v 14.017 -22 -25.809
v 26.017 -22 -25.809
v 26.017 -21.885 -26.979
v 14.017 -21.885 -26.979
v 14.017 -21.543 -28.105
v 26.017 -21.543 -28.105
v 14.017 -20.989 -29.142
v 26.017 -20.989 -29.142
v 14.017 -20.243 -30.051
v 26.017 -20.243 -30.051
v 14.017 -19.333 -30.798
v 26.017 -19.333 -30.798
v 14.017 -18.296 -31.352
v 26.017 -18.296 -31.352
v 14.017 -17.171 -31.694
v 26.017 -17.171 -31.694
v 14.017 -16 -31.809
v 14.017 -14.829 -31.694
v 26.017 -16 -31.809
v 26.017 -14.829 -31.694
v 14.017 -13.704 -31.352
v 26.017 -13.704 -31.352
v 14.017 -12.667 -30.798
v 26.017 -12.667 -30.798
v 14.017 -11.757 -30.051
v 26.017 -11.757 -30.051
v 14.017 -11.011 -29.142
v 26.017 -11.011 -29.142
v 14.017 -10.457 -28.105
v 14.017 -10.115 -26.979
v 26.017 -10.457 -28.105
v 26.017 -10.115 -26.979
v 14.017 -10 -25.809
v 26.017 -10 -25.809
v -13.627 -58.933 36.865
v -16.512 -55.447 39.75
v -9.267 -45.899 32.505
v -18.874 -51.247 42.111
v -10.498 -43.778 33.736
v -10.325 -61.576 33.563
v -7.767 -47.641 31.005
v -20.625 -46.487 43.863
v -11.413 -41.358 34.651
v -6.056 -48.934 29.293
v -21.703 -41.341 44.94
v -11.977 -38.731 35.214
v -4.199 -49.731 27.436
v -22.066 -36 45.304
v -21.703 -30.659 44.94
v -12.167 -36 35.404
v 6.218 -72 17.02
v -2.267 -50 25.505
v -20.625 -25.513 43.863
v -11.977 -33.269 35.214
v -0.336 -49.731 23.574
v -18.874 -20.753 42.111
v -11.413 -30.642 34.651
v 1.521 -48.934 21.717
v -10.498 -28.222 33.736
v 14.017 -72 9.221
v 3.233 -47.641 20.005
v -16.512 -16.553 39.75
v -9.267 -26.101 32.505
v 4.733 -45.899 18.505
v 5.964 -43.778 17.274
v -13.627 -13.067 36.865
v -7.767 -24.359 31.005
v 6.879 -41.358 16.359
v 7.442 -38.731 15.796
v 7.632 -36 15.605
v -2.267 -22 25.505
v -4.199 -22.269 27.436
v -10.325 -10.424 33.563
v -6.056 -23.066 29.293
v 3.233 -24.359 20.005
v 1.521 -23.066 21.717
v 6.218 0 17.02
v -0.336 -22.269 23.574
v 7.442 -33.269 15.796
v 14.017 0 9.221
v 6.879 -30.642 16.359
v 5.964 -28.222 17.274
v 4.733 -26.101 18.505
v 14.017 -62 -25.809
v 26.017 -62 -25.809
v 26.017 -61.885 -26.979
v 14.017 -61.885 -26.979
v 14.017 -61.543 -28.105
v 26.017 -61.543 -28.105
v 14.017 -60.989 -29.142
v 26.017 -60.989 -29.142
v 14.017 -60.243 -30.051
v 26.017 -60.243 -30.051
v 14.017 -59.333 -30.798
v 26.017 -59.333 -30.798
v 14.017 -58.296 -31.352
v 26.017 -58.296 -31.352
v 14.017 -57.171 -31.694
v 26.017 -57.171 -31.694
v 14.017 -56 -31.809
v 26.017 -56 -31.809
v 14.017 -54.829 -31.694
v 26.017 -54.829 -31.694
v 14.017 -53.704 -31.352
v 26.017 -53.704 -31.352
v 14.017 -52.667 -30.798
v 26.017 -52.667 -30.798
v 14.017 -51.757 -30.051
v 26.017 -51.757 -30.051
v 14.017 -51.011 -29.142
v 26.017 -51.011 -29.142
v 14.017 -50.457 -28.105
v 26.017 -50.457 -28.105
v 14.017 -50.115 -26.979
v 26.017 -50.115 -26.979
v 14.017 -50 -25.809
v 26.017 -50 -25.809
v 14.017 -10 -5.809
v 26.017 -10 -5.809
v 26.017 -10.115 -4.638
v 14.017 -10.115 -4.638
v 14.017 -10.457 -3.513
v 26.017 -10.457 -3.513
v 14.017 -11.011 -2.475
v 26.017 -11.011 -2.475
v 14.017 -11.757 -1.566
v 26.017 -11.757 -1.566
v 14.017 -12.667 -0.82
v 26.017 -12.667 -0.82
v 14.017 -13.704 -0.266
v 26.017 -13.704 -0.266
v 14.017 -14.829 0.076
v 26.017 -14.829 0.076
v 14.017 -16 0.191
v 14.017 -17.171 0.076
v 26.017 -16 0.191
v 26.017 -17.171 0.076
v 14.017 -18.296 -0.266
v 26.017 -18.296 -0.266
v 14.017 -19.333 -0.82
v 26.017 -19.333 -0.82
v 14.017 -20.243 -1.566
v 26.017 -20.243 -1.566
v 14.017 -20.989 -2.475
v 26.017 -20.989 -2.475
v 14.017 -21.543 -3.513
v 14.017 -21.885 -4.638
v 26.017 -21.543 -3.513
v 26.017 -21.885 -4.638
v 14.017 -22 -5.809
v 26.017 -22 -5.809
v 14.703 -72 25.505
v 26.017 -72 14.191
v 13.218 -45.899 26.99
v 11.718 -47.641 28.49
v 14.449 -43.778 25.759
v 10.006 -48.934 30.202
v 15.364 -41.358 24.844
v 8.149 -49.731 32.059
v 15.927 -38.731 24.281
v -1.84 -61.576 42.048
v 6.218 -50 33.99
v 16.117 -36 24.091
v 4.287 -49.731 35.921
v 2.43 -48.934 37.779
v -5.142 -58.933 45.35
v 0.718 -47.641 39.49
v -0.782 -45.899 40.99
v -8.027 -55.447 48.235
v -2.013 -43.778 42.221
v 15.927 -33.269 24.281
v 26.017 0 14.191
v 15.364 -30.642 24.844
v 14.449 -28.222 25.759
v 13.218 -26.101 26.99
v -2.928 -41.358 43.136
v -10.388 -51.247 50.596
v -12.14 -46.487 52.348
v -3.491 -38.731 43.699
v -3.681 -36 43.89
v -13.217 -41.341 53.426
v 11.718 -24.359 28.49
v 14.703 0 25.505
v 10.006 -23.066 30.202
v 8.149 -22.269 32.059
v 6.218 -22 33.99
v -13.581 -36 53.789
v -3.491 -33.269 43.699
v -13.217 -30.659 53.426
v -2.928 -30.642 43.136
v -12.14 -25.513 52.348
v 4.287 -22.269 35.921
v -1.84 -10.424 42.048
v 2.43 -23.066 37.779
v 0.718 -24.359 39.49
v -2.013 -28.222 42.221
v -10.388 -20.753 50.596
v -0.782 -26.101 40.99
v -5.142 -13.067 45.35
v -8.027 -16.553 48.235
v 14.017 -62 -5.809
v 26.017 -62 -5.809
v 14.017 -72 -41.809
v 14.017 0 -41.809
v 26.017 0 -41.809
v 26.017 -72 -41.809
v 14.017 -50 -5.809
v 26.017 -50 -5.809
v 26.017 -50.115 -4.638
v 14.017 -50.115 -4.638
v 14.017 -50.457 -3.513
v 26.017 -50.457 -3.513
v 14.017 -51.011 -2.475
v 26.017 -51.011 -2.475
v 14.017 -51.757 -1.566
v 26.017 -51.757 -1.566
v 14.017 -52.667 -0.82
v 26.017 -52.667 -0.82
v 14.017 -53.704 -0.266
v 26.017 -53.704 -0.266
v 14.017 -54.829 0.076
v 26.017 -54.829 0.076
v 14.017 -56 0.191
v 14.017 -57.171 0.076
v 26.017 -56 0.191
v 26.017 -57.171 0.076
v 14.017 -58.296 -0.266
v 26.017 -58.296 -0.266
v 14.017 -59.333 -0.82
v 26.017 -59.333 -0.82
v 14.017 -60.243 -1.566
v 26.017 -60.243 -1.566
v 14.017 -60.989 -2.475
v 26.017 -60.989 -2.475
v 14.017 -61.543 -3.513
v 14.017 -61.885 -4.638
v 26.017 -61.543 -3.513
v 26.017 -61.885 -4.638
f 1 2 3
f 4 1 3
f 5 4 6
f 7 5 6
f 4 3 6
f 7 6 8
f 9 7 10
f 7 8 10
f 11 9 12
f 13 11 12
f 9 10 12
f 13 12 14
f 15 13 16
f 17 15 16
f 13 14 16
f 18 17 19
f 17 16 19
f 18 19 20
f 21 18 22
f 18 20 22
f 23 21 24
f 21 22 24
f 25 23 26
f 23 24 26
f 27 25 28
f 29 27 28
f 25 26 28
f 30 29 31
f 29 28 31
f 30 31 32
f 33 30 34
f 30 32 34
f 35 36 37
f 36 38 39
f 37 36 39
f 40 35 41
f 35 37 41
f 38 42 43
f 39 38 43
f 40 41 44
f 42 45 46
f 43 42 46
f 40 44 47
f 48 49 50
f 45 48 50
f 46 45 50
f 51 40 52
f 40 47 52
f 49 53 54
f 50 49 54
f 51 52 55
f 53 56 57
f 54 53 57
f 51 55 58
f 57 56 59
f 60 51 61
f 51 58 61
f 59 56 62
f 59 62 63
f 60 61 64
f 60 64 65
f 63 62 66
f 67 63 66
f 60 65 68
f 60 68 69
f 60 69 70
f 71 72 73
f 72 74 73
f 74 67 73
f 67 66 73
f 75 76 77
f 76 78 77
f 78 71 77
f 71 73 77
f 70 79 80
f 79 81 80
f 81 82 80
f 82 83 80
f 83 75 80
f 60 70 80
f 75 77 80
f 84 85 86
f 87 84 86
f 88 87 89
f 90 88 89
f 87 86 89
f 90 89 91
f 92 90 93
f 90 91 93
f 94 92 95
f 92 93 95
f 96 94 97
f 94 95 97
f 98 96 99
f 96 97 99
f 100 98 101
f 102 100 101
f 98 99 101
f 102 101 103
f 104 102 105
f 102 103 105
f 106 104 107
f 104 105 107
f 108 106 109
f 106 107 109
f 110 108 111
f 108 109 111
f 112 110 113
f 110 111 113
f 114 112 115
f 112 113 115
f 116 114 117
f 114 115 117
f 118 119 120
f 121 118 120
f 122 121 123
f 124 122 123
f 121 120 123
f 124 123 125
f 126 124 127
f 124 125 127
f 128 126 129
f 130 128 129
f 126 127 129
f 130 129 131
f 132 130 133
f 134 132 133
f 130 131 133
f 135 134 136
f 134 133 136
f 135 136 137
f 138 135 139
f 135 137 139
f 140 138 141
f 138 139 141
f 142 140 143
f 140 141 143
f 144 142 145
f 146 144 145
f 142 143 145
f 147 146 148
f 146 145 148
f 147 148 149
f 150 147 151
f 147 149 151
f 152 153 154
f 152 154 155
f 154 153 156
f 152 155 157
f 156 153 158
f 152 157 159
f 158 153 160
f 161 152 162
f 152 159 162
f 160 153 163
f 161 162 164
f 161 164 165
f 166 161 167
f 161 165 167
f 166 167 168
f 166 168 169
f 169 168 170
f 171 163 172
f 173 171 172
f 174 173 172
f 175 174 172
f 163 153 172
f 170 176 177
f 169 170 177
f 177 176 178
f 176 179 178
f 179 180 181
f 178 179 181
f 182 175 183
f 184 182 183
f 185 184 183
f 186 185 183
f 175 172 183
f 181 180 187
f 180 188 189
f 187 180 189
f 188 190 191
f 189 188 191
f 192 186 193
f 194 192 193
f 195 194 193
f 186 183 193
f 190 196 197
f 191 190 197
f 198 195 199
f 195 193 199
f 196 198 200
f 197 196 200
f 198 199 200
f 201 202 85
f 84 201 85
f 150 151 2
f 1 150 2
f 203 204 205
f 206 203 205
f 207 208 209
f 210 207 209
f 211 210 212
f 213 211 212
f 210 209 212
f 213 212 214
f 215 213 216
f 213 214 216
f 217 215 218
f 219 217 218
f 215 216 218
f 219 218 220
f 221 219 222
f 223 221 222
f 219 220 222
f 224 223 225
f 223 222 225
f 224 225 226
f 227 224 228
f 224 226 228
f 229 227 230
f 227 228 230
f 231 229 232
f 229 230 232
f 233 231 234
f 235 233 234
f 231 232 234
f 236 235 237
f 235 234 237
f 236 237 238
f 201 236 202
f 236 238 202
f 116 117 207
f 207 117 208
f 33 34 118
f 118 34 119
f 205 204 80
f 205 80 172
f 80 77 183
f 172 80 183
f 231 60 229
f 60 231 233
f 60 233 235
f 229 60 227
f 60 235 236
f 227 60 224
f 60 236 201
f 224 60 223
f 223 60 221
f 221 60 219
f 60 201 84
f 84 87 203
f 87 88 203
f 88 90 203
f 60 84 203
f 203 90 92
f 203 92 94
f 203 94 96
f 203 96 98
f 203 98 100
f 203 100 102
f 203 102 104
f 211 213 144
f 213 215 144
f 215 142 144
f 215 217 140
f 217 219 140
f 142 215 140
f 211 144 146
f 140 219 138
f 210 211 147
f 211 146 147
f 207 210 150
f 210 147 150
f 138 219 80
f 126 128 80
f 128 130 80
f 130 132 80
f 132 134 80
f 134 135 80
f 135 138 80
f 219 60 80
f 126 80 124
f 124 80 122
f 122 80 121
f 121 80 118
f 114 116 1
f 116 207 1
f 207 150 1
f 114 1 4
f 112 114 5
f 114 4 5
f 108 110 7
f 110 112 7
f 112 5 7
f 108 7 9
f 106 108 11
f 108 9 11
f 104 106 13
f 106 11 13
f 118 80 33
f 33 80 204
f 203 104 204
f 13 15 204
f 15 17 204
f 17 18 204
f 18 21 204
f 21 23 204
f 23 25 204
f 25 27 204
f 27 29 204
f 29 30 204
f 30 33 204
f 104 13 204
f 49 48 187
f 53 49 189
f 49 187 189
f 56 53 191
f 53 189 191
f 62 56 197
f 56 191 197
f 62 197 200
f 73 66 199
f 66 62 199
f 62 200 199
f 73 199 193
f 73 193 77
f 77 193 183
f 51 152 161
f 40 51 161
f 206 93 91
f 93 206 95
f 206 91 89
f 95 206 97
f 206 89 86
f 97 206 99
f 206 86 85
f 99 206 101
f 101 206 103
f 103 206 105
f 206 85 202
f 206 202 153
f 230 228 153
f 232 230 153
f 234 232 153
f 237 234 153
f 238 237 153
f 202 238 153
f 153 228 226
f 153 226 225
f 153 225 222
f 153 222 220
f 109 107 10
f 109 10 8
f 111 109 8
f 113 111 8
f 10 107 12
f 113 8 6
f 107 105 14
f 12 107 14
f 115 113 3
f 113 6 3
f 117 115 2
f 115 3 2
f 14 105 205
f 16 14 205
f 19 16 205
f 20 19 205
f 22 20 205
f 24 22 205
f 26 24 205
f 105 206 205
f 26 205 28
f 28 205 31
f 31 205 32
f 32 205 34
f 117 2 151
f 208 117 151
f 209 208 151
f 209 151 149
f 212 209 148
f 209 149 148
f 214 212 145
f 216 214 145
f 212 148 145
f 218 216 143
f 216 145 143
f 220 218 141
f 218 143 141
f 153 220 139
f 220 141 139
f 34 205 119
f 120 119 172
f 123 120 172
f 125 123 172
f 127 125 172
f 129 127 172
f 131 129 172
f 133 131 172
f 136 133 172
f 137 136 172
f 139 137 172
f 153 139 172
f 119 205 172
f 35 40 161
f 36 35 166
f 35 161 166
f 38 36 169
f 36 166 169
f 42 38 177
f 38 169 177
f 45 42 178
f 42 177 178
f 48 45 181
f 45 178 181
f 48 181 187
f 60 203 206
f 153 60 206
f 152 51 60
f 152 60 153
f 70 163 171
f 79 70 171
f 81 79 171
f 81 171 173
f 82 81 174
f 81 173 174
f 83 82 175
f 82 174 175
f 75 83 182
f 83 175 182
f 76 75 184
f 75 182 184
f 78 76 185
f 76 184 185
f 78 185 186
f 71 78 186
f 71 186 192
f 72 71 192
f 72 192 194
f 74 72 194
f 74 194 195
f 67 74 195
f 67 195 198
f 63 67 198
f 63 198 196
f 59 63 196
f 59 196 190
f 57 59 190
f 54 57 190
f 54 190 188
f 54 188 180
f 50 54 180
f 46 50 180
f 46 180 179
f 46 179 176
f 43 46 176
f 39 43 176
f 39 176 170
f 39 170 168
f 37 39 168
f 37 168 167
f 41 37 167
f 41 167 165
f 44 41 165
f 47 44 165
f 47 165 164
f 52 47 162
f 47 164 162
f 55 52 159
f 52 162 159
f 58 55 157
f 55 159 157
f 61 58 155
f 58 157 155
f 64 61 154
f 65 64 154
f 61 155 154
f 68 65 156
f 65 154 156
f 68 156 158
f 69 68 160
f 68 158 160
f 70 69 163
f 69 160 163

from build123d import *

# Parameters (mm, degrees)
F1_DEPTH = 72
F2_R     = 14
F3_DEPTH = 25
F6_DEPTH = 25
F8_DEPTH = 25


with BuildPart() as f1:
    # F0 (on Front) → F1 (new body)
    with BuildSketch(Plane.XZ):
        Polygon((26.0169860537, -41.8088145156), (26.0169860537, 14.1911854844), (-13.5809936927, 53.7891652309), (-22.066275067, 45.3038838566), (14.0169860537, 9.2206227359), (14.0169860537, -41.8088145156), align=None)
    extrude(amount=F1_DEPTH)

    # F2 (on face) → F3 (cut)
    with BuildSketch(Plane(origin=(20.1040857691, 0, 20.1040857691), x_dir=(0.7071067812, 0, -0.7071067812), z_dir=(0.7071067812, 0, 0.7071067812))):
        with Locations((-19.6378962245, -36)):
            Circle(F2_R)
    extrude(amount=-F3_DEPTH, mode=Mode.SUBTRACT)

    # F5 (on face) + F4 (on face) → F6 (cut)
    with BuildSketch(Plane(origin=(20.1040857691, 0, 20.1040857691), x_dir=(0.7071067812, 0, -0.7071067812), z_dir=(0.7071067812, 0, 0.7071067812))):
        Polygon((-47.6378962245, -17.821869662), (-31.0333128979, -10.4237516661), (-7.6378962245, 0), (-47.6378962245, 0), align=None)
        Polygon((-47.6378962245, -72), (-7.6378962245, -72), (-31.0333098725, -61.5762496819), (-47.6378962245, -54.178130338), align=None)
        with BuildLine():
            Line((-47.6378962245, -54.178130338), (-31.0333098725, -61.5762496819))
            ThreePointArc((-31.0333098725, -61.5762496819), (-43.1226953736, -51.2467770013), (-47.6378962245, -36))
            Line((-47.6378962245, -36), (-47.6378962245, -54.178130338))
        make_face()
    with BuildSketch(Plane(origin=(20.1040857691, 0, 20.1040857691), x_dir=(0.7071067812, 0, -0.7071067812), z_dir=(0.7071067812, 0, 0.7071067812))):
        with BuildLine():
            Line((-31.0333129323, -10.4237516814), (-88.4374995943, -36))
            Line((-88.4374995943, -36), (-31.0333096209, -61.576249794))
            ThreePointArc((-31.0333096209, -61.576249794), (-43.1226952986, -51.2467771168), (-47.6378962245, -36))
            ThreePointArc((-47.6378962245, -36), (-43.1226962856, -20.7532244035), (-31.0333129323, -10.4237516814))
        make_face()
    extrude(amount=-F6_DEPTH, mode=Mode.SUBTRACT)

    # F7 (on face) → F8 (cut)
    with BuildSketch(Plane.YZ.offset(26.0169860537)):
        with BuildLine():
            ThreePointArc((-62, -25.8088145156), (-56, -31.8088145156), (-50, -25.8088145156))
            ThreePointArc((-50, -25.8088145156), (-56, -19.8088145156), (-62, -25.8088145156))
        make_face()
        with BuildLine():
            ThreePointArc((-62, -25.8088145156), (-56, -19.8088145156), (-50, -25.8088145156))
            Line((-50, -25.8088145156), (-50, -5.8088145156))
            ThreePointArc((-50, -5.8088145156), (-56, -11.8088145156), (-62, -5.8088145156))
            Line((-62, -5.8088145156), (-62, -25.8088145156))
        make_face()
        with BuildLine():
            ThreePointArc((-62, -5.8088145156), (-56, -11.8088145156), (-50, -5.8088145156))
            ThreePointArc((-50, -5.8088145156), (-56, 0.1911854844), (-62, -5.8088145156))
        make_face()
        with BuildLine():
            Line((-22, -25.8088145156), (-10, -25.8088145156))
            ThreePointArc((-10, -25.8088145156), (-16, -19.8088145156), (-22, -25.8088145156))
        make_face()
        with BuildLine():
            ThreePointArc((-22, -25.8088145156), (-16, -31.8088145156), (-10, -25.8088145156))
            Line((-10, -25.8088145156), (-22, -25.8088145156))
        make_face()
        with BuildLine():
            ThreePointArc((-22, -25.8088145156), (-16, -19.8088145156), (-10, -25.8088145156))
            Line((-10, -25.8088145156), (-10, -5.8088145156))
            ThreePointArc((-10, -5.8088145156), (-16, -11.8088145156), (-22, -5.8088145156))
            Line((-22, -5.8088145156), (-22, -25.8088145156))
        make_face()
        with BuildLine():
            ThreePointArc((-22, -5.8088145156), (-16, -11.8088145156), (-10, -5.8088145156))
            ThreePointArc((-10, -5.8088145156), (-16, 0.1911854844), (-22, -5.8088145156))
        make_face()
    extrude(amount=-F8_DEPTH, mode=Mode.SUBTRACT)


solid = f1.part
